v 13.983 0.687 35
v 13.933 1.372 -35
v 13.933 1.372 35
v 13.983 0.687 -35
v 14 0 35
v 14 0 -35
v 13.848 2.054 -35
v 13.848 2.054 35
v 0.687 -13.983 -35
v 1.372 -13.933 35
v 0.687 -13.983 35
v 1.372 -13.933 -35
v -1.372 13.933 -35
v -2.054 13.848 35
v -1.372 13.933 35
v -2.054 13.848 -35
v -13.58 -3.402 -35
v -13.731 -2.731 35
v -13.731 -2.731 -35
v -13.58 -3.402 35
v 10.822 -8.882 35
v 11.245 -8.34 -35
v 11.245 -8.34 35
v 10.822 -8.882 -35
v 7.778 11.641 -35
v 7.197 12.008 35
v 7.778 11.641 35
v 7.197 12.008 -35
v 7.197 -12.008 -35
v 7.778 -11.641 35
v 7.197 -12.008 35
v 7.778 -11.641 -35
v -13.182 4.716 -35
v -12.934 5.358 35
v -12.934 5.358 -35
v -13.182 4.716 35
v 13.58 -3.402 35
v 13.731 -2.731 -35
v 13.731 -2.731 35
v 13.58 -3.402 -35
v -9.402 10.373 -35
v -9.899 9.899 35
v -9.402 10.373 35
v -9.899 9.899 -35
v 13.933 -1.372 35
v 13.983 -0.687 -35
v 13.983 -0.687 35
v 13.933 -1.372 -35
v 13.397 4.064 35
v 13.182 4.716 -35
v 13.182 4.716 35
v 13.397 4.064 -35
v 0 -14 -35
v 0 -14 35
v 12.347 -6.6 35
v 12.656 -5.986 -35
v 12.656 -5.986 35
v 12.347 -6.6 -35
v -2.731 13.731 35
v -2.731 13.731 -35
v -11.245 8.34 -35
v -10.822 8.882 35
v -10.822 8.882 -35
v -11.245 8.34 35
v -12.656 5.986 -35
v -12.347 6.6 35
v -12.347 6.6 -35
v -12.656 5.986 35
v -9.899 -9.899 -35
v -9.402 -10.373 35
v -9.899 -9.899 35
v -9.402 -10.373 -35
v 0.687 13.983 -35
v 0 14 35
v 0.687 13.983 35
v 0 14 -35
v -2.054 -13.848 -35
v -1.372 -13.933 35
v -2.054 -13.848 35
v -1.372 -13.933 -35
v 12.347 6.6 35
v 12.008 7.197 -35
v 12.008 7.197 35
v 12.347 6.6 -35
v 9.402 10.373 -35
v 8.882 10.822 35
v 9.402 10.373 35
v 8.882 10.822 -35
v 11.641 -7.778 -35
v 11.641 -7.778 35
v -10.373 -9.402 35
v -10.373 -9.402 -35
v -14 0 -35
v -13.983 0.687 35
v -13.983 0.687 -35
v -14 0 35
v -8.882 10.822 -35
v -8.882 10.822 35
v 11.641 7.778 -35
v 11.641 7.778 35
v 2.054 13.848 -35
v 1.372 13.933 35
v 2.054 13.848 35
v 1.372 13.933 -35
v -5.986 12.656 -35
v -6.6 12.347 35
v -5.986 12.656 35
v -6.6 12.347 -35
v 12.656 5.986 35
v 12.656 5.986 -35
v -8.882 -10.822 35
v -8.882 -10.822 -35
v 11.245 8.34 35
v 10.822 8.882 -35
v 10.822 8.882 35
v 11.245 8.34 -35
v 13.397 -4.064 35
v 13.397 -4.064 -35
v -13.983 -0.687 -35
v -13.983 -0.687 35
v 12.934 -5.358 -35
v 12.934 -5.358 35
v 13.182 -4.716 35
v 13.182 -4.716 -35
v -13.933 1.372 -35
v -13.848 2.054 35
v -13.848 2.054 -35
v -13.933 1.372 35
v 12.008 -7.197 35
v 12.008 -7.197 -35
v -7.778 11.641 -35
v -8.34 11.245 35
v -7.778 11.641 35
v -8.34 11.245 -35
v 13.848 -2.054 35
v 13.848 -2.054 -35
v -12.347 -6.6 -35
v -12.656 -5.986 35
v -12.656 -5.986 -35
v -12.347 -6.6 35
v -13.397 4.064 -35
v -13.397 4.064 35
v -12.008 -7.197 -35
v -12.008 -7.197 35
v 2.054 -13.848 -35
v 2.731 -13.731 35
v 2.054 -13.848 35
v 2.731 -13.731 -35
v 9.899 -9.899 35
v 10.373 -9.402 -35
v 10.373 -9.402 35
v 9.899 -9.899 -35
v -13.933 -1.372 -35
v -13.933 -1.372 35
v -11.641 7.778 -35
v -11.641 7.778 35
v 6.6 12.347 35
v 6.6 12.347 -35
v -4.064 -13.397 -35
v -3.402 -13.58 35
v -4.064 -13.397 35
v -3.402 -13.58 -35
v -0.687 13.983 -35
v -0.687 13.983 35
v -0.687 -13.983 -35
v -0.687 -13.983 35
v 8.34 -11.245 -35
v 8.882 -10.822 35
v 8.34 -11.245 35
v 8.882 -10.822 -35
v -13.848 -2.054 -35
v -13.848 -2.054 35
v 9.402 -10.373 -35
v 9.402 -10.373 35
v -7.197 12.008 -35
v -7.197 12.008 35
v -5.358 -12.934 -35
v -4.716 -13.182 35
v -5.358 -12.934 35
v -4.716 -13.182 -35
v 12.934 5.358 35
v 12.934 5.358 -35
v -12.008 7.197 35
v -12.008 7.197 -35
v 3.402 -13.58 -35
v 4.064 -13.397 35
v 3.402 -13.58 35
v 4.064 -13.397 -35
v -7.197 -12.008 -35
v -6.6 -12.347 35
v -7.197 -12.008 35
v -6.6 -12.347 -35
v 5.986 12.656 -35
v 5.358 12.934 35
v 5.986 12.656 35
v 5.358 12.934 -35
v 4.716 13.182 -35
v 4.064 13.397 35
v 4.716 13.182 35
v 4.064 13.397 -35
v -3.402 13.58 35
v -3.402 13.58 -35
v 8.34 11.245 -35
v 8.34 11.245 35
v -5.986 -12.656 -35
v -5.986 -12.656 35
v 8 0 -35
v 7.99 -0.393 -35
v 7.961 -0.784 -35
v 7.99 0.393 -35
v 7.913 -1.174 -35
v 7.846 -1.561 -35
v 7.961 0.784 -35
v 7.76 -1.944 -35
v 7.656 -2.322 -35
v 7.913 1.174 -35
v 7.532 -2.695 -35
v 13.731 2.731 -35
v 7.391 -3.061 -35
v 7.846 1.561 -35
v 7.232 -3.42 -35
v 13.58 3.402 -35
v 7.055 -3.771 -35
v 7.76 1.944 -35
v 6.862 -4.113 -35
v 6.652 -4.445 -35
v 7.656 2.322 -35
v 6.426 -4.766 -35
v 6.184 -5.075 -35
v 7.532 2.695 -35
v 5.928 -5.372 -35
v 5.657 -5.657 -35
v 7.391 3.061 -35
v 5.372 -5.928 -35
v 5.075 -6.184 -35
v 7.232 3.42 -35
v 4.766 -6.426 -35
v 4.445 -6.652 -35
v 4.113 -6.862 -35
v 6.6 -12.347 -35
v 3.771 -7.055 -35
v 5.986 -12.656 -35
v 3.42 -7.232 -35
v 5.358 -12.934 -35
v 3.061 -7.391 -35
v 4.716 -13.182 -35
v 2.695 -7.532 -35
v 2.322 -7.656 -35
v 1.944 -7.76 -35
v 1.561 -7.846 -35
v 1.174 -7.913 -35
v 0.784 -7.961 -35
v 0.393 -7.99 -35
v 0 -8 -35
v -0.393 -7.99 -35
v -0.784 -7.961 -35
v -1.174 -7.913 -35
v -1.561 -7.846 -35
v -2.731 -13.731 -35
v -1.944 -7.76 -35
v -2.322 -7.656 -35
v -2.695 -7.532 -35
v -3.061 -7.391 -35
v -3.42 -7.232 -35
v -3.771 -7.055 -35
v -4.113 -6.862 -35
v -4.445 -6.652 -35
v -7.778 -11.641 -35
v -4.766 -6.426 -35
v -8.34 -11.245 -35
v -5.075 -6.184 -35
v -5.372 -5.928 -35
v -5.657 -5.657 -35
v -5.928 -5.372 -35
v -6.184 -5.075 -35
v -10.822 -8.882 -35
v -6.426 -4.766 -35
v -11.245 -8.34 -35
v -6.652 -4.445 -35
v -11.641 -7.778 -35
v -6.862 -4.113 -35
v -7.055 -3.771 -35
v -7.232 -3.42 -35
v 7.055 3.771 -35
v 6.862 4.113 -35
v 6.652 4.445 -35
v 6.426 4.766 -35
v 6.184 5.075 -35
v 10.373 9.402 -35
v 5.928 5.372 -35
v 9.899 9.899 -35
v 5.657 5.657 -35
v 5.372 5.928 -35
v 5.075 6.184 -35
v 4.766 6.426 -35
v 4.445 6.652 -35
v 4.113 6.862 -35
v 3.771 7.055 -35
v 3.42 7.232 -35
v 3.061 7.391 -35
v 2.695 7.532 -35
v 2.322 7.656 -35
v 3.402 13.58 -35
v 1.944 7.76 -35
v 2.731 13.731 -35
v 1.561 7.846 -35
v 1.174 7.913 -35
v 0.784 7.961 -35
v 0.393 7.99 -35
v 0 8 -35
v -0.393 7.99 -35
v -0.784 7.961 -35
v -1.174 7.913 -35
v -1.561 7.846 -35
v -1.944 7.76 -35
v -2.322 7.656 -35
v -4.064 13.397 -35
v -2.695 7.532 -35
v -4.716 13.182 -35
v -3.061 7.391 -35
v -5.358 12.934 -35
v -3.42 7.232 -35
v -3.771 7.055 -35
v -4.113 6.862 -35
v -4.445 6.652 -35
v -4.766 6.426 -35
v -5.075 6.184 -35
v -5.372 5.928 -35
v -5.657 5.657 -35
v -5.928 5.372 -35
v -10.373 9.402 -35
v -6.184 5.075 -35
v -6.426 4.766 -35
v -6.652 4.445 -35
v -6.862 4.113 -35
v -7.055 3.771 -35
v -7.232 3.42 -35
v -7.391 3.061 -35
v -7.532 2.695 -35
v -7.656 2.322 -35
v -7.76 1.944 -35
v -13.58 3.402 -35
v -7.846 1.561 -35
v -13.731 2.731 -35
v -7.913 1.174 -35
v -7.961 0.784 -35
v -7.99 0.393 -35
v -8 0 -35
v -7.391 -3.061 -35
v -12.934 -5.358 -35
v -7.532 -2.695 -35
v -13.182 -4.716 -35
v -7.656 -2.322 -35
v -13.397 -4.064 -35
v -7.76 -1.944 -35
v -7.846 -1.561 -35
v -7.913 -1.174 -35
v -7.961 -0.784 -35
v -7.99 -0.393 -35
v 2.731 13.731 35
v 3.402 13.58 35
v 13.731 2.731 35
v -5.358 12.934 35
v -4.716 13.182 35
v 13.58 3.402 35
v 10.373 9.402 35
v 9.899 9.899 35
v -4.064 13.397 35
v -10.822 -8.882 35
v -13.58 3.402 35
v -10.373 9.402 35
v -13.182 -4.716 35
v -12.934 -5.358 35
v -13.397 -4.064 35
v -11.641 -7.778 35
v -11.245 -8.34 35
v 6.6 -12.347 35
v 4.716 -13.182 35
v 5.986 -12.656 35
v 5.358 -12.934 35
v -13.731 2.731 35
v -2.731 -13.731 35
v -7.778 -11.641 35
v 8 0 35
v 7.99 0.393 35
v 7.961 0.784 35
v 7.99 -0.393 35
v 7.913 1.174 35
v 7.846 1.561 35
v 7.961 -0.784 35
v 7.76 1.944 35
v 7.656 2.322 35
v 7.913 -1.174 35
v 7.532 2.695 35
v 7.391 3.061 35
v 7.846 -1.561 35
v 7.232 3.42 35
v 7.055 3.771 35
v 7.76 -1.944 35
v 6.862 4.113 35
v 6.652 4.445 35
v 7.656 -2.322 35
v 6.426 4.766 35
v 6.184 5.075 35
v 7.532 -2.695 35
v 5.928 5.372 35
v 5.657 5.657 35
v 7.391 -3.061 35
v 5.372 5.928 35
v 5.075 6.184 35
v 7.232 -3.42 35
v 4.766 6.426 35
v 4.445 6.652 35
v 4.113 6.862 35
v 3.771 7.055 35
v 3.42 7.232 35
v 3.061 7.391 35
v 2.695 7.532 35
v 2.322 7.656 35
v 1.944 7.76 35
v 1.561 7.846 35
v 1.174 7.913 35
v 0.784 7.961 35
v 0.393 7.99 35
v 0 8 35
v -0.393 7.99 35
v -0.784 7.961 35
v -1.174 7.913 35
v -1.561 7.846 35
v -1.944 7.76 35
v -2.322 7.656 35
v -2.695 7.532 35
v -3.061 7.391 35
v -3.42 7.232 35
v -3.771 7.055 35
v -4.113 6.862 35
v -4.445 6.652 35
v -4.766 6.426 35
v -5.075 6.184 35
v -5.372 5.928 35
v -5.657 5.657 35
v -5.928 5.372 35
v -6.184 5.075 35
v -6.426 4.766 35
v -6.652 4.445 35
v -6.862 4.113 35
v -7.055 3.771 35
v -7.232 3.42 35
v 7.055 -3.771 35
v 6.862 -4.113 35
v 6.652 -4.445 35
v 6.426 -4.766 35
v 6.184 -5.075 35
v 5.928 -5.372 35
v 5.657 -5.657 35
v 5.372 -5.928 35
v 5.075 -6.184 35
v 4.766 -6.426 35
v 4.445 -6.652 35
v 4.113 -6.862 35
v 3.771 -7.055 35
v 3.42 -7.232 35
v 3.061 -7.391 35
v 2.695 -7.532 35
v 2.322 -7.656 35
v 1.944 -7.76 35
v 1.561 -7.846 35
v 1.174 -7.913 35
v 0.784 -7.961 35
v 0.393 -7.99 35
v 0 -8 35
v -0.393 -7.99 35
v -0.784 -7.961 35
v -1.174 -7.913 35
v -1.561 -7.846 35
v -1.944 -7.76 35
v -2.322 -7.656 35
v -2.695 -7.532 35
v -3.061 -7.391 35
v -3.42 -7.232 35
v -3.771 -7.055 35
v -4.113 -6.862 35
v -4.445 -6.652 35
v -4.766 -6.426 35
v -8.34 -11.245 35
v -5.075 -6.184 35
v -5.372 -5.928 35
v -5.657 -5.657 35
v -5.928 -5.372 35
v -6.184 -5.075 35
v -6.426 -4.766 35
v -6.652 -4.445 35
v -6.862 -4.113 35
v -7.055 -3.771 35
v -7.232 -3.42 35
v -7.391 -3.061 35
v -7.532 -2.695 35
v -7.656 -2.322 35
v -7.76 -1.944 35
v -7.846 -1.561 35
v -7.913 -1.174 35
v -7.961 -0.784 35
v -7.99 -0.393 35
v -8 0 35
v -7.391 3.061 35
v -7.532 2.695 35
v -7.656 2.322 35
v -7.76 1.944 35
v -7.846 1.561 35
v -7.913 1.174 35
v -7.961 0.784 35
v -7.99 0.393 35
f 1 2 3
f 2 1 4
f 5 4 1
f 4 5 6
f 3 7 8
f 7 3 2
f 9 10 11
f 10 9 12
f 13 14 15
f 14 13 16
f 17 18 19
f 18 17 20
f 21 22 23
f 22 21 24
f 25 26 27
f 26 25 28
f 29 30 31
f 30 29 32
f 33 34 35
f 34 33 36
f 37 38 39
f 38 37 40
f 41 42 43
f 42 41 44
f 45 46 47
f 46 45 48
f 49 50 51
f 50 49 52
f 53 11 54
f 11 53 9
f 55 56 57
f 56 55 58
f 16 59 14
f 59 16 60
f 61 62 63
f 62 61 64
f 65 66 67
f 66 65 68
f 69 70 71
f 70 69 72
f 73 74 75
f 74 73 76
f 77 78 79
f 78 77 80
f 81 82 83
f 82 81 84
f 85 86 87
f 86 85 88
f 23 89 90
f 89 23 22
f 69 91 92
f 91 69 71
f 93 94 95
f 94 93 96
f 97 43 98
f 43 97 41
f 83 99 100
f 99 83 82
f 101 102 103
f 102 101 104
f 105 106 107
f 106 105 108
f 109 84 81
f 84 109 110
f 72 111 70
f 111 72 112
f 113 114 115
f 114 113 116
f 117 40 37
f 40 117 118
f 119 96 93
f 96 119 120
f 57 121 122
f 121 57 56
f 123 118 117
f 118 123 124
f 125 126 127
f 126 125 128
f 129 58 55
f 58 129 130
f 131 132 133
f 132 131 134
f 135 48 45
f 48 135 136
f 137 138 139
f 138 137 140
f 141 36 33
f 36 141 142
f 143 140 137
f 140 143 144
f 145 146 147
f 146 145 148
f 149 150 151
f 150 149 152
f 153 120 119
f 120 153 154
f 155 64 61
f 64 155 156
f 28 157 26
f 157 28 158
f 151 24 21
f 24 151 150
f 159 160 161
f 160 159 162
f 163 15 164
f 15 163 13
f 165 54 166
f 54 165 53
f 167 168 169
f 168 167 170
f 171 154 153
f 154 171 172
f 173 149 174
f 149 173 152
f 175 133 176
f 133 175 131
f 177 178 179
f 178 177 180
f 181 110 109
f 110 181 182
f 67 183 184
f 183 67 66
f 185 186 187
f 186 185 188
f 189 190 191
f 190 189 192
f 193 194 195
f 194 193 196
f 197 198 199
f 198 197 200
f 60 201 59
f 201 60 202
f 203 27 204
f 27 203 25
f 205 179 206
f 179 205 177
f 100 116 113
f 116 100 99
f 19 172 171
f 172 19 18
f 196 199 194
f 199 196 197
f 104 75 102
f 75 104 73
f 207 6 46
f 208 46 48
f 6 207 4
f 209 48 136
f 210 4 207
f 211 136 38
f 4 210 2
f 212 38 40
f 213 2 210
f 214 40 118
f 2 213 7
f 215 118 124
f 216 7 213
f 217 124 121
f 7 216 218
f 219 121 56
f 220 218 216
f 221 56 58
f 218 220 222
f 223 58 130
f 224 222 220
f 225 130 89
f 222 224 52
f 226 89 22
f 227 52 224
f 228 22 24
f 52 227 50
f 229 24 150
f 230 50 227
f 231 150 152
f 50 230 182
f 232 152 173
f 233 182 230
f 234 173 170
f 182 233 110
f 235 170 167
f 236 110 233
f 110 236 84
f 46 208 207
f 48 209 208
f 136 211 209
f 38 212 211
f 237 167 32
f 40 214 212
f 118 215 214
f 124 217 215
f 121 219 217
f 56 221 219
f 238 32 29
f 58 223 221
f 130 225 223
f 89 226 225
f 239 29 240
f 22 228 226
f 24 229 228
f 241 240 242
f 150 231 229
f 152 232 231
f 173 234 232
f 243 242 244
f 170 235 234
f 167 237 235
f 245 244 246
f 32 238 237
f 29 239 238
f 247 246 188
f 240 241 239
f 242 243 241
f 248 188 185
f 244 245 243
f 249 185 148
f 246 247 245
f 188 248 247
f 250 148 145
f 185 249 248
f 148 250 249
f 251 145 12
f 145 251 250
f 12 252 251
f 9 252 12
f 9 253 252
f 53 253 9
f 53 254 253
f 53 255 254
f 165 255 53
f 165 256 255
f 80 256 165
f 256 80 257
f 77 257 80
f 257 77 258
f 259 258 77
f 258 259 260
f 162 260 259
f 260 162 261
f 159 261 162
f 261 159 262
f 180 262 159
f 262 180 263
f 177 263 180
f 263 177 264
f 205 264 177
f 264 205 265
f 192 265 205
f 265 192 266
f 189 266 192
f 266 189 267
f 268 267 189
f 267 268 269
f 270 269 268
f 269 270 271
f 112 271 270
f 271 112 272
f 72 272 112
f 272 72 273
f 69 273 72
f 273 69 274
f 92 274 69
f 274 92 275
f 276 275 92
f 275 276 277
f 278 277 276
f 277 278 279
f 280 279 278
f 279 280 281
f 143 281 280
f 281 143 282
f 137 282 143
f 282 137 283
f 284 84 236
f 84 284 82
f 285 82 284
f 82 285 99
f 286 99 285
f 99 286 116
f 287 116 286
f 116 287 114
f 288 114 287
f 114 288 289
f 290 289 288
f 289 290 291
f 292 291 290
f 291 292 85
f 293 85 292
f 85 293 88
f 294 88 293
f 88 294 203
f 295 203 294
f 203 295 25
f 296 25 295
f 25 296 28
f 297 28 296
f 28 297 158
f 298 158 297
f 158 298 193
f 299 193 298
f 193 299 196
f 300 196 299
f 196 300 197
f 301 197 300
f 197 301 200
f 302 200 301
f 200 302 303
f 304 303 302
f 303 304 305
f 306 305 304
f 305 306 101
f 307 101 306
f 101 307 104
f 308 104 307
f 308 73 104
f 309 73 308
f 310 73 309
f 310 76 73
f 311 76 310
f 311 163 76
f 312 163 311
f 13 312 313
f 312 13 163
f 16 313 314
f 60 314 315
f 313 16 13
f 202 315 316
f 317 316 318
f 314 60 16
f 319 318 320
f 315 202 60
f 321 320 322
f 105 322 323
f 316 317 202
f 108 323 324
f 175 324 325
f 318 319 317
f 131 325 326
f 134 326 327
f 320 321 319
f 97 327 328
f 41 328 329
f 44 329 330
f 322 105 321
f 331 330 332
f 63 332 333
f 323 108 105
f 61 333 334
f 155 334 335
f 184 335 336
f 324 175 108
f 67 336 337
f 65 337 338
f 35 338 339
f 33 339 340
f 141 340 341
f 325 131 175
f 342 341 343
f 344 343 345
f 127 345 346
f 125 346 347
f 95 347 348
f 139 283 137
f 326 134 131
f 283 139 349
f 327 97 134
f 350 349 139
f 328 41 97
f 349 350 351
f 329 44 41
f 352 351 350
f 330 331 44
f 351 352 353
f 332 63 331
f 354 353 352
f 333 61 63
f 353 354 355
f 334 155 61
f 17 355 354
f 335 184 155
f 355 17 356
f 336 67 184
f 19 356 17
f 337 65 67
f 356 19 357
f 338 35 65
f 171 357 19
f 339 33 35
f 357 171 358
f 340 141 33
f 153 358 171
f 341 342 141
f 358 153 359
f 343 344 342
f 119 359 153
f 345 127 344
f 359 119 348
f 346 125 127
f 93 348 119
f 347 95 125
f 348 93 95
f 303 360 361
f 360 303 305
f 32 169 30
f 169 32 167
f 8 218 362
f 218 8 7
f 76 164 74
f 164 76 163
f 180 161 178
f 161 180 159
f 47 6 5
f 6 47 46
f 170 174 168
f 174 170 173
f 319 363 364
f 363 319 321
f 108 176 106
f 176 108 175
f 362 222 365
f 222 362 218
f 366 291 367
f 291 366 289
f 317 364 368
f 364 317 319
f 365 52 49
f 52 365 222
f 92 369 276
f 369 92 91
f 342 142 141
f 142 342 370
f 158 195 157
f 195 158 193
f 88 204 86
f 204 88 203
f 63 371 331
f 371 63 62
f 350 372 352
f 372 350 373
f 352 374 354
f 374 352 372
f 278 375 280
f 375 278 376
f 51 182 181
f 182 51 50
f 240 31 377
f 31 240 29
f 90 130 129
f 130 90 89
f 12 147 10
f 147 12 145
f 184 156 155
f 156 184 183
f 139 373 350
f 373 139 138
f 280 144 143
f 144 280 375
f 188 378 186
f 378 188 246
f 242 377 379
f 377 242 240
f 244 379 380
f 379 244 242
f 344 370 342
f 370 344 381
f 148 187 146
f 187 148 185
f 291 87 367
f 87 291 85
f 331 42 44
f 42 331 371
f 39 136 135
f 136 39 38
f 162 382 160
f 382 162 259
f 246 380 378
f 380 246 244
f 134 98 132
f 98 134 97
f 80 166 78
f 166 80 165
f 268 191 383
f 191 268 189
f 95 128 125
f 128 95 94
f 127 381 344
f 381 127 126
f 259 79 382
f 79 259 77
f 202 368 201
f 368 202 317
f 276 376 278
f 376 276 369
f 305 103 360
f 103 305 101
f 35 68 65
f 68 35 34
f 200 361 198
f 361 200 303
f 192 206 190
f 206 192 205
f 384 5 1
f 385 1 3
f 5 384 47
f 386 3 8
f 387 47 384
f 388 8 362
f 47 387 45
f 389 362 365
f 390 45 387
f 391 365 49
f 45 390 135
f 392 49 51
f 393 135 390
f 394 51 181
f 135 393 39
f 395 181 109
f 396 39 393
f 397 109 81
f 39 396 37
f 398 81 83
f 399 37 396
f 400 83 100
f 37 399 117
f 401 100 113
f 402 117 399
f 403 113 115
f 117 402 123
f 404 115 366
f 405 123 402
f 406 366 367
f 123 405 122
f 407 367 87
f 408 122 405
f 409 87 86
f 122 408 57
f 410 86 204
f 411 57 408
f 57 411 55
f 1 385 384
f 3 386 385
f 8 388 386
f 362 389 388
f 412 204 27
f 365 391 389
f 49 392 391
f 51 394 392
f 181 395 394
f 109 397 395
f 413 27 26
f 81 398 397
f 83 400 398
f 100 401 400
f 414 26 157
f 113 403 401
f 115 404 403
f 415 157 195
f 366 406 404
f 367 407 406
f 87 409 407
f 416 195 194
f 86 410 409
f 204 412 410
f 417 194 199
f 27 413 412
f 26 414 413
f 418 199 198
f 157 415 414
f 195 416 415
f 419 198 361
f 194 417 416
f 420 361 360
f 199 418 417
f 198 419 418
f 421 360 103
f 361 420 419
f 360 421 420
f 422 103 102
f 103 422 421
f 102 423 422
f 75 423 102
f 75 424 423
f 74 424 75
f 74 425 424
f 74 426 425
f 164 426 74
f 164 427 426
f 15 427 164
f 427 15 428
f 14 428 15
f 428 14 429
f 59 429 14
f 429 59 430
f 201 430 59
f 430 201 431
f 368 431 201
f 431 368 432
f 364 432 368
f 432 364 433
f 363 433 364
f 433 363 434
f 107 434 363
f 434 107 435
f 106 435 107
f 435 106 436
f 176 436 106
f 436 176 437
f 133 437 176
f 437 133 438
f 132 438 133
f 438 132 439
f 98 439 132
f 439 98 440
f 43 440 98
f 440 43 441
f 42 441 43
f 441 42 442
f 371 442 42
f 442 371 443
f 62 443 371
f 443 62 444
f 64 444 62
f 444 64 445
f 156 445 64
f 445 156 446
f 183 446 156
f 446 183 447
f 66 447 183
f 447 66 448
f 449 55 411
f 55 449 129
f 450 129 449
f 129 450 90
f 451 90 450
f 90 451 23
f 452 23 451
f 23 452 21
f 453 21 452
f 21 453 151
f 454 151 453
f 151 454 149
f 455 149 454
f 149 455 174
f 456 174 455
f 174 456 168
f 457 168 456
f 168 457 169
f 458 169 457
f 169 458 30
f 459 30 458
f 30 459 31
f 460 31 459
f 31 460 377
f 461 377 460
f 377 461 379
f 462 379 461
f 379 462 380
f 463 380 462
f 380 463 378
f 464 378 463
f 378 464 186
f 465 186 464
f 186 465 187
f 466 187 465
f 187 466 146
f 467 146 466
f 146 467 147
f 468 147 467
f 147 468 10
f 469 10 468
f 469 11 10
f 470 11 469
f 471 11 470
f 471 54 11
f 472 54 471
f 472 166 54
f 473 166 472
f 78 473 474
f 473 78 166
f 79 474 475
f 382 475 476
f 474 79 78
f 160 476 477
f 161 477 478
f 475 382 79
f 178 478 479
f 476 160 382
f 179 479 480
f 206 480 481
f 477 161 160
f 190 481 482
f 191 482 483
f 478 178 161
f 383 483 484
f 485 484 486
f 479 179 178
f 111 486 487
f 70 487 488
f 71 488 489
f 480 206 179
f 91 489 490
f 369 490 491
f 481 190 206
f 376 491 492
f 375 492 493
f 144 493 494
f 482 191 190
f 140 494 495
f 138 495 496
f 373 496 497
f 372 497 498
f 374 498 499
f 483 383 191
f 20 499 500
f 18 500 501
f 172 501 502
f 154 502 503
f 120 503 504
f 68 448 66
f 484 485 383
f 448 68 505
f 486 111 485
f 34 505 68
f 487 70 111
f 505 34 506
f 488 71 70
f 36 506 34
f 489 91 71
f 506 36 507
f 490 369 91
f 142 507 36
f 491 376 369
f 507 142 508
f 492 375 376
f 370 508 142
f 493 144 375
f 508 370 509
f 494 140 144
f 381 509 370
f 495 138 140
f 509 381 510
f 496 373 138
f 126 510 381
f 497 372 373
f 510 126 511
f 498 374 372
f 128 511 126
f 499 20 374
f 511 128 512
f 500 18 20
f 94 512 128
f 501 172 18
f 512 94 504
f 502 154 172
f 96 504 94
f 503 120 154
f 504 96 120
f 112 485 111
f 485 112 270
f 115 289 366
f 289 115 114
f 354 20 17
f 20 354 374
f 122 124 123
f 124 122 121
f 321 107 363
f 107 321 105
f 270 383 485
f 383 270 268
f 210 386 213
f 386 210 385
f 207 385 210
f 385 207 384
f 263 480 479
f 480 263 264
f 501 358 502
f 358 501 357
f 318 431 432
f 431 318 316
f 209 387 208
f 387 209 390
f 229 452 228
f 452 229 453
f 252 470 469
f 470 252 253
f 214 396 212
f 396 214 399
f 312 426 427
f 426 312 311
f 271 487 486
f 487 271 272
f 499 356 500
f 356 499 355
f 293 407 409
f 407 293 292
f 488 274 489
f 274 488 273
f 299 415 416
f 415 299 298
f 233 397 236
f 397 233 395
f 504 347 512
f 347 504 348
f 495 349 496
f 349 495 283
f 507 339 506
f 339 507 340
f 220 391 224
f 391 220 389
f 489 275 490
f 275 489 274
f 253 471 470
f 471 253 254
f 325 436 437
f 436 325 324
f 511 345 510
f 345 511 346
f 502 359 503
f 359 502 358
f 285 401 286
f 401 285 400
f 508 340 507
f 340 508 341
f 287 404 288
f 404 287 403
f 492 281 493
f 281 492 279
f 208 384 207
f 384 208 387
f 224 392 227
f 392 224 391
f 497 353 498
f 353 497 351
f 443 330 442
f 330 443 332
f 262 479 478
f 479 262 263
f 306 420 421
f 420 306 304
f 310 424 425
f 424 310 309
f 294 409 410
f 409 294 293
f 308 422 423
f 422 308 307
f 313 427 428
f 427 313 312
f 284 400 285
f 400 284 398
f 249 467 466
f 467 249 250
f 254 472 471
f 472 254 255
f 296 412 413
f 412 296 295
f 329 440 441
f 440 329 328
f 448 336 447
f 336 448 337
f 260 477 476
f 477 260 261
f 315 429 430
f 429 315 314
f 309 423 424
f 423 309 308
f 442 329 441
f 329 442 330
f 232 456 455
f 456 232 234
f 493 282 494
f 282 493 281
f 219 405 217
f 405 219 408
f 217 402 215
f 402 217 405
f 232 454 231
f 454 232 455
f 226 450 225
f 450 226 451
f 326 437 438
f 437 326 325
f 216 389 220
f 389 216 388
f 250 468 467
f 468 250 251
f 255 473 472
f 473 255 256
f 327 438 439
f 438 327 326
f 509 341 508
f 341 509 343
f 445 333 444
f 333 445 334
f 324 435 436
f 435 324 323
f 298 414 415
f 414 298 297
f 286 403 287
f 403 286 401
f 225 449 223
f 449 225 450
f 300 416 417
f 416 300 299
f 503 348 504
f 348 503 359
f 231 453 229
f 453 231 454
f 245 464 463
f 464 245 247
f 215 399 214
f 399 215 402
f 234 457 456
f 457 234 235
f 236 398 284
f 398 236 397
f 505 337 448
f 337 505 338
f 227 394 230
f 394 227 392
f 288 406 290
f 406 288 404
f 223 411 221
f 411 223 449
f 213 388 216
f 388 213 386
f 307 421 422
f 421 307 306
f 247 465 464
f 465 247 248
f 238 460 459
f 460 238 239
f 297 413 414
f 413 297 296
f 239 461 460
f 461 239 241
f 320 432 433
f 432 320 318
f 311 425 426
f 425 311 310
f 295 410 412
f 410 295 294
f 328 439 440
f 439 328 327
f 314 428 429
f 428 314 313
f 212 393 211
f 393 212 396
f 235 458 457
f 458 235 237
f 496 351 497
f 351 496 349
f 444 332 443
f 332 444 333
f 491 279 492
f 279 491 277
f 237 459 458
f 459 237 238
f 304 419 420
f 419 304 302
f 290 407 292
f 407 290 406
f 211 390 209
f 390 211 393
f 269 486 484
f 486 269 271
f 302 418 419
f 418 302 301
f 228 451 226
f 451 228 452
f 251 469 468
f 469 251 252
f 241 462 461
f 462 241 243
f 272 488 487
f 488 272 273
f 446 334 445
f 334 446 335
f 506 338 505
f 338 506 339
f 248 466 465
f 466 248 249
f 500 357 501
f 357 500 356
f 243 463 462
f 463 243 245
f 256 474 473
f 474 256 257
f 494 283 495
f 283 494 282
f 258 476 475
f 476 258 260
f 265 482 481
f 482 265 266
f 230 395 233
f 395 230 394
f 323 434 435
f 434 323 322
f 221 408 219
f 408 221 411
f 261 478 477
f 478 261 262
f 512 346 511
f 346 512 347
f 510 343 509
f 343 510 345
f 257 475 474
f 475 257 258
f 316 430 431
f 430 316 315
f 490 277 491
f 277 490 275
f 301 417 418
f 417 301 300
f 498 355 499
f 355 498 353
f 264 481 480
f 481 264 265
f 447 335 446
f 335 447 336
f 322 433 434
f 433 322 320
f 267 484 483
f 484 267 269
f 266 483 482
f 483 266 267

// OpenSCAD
$fn=128;

bore_d = 16.0;
od_d = 28.0;
len = 70.0;

module linear_bearing(bore_d, od_d, len){
    difference(){
        cylinder(d=od_d, h=len, center=true);
        cylinder(d=bore_d, h=len+0.2, center=true);
    }
}

linear_bearing(bore_d, od_d, len);
